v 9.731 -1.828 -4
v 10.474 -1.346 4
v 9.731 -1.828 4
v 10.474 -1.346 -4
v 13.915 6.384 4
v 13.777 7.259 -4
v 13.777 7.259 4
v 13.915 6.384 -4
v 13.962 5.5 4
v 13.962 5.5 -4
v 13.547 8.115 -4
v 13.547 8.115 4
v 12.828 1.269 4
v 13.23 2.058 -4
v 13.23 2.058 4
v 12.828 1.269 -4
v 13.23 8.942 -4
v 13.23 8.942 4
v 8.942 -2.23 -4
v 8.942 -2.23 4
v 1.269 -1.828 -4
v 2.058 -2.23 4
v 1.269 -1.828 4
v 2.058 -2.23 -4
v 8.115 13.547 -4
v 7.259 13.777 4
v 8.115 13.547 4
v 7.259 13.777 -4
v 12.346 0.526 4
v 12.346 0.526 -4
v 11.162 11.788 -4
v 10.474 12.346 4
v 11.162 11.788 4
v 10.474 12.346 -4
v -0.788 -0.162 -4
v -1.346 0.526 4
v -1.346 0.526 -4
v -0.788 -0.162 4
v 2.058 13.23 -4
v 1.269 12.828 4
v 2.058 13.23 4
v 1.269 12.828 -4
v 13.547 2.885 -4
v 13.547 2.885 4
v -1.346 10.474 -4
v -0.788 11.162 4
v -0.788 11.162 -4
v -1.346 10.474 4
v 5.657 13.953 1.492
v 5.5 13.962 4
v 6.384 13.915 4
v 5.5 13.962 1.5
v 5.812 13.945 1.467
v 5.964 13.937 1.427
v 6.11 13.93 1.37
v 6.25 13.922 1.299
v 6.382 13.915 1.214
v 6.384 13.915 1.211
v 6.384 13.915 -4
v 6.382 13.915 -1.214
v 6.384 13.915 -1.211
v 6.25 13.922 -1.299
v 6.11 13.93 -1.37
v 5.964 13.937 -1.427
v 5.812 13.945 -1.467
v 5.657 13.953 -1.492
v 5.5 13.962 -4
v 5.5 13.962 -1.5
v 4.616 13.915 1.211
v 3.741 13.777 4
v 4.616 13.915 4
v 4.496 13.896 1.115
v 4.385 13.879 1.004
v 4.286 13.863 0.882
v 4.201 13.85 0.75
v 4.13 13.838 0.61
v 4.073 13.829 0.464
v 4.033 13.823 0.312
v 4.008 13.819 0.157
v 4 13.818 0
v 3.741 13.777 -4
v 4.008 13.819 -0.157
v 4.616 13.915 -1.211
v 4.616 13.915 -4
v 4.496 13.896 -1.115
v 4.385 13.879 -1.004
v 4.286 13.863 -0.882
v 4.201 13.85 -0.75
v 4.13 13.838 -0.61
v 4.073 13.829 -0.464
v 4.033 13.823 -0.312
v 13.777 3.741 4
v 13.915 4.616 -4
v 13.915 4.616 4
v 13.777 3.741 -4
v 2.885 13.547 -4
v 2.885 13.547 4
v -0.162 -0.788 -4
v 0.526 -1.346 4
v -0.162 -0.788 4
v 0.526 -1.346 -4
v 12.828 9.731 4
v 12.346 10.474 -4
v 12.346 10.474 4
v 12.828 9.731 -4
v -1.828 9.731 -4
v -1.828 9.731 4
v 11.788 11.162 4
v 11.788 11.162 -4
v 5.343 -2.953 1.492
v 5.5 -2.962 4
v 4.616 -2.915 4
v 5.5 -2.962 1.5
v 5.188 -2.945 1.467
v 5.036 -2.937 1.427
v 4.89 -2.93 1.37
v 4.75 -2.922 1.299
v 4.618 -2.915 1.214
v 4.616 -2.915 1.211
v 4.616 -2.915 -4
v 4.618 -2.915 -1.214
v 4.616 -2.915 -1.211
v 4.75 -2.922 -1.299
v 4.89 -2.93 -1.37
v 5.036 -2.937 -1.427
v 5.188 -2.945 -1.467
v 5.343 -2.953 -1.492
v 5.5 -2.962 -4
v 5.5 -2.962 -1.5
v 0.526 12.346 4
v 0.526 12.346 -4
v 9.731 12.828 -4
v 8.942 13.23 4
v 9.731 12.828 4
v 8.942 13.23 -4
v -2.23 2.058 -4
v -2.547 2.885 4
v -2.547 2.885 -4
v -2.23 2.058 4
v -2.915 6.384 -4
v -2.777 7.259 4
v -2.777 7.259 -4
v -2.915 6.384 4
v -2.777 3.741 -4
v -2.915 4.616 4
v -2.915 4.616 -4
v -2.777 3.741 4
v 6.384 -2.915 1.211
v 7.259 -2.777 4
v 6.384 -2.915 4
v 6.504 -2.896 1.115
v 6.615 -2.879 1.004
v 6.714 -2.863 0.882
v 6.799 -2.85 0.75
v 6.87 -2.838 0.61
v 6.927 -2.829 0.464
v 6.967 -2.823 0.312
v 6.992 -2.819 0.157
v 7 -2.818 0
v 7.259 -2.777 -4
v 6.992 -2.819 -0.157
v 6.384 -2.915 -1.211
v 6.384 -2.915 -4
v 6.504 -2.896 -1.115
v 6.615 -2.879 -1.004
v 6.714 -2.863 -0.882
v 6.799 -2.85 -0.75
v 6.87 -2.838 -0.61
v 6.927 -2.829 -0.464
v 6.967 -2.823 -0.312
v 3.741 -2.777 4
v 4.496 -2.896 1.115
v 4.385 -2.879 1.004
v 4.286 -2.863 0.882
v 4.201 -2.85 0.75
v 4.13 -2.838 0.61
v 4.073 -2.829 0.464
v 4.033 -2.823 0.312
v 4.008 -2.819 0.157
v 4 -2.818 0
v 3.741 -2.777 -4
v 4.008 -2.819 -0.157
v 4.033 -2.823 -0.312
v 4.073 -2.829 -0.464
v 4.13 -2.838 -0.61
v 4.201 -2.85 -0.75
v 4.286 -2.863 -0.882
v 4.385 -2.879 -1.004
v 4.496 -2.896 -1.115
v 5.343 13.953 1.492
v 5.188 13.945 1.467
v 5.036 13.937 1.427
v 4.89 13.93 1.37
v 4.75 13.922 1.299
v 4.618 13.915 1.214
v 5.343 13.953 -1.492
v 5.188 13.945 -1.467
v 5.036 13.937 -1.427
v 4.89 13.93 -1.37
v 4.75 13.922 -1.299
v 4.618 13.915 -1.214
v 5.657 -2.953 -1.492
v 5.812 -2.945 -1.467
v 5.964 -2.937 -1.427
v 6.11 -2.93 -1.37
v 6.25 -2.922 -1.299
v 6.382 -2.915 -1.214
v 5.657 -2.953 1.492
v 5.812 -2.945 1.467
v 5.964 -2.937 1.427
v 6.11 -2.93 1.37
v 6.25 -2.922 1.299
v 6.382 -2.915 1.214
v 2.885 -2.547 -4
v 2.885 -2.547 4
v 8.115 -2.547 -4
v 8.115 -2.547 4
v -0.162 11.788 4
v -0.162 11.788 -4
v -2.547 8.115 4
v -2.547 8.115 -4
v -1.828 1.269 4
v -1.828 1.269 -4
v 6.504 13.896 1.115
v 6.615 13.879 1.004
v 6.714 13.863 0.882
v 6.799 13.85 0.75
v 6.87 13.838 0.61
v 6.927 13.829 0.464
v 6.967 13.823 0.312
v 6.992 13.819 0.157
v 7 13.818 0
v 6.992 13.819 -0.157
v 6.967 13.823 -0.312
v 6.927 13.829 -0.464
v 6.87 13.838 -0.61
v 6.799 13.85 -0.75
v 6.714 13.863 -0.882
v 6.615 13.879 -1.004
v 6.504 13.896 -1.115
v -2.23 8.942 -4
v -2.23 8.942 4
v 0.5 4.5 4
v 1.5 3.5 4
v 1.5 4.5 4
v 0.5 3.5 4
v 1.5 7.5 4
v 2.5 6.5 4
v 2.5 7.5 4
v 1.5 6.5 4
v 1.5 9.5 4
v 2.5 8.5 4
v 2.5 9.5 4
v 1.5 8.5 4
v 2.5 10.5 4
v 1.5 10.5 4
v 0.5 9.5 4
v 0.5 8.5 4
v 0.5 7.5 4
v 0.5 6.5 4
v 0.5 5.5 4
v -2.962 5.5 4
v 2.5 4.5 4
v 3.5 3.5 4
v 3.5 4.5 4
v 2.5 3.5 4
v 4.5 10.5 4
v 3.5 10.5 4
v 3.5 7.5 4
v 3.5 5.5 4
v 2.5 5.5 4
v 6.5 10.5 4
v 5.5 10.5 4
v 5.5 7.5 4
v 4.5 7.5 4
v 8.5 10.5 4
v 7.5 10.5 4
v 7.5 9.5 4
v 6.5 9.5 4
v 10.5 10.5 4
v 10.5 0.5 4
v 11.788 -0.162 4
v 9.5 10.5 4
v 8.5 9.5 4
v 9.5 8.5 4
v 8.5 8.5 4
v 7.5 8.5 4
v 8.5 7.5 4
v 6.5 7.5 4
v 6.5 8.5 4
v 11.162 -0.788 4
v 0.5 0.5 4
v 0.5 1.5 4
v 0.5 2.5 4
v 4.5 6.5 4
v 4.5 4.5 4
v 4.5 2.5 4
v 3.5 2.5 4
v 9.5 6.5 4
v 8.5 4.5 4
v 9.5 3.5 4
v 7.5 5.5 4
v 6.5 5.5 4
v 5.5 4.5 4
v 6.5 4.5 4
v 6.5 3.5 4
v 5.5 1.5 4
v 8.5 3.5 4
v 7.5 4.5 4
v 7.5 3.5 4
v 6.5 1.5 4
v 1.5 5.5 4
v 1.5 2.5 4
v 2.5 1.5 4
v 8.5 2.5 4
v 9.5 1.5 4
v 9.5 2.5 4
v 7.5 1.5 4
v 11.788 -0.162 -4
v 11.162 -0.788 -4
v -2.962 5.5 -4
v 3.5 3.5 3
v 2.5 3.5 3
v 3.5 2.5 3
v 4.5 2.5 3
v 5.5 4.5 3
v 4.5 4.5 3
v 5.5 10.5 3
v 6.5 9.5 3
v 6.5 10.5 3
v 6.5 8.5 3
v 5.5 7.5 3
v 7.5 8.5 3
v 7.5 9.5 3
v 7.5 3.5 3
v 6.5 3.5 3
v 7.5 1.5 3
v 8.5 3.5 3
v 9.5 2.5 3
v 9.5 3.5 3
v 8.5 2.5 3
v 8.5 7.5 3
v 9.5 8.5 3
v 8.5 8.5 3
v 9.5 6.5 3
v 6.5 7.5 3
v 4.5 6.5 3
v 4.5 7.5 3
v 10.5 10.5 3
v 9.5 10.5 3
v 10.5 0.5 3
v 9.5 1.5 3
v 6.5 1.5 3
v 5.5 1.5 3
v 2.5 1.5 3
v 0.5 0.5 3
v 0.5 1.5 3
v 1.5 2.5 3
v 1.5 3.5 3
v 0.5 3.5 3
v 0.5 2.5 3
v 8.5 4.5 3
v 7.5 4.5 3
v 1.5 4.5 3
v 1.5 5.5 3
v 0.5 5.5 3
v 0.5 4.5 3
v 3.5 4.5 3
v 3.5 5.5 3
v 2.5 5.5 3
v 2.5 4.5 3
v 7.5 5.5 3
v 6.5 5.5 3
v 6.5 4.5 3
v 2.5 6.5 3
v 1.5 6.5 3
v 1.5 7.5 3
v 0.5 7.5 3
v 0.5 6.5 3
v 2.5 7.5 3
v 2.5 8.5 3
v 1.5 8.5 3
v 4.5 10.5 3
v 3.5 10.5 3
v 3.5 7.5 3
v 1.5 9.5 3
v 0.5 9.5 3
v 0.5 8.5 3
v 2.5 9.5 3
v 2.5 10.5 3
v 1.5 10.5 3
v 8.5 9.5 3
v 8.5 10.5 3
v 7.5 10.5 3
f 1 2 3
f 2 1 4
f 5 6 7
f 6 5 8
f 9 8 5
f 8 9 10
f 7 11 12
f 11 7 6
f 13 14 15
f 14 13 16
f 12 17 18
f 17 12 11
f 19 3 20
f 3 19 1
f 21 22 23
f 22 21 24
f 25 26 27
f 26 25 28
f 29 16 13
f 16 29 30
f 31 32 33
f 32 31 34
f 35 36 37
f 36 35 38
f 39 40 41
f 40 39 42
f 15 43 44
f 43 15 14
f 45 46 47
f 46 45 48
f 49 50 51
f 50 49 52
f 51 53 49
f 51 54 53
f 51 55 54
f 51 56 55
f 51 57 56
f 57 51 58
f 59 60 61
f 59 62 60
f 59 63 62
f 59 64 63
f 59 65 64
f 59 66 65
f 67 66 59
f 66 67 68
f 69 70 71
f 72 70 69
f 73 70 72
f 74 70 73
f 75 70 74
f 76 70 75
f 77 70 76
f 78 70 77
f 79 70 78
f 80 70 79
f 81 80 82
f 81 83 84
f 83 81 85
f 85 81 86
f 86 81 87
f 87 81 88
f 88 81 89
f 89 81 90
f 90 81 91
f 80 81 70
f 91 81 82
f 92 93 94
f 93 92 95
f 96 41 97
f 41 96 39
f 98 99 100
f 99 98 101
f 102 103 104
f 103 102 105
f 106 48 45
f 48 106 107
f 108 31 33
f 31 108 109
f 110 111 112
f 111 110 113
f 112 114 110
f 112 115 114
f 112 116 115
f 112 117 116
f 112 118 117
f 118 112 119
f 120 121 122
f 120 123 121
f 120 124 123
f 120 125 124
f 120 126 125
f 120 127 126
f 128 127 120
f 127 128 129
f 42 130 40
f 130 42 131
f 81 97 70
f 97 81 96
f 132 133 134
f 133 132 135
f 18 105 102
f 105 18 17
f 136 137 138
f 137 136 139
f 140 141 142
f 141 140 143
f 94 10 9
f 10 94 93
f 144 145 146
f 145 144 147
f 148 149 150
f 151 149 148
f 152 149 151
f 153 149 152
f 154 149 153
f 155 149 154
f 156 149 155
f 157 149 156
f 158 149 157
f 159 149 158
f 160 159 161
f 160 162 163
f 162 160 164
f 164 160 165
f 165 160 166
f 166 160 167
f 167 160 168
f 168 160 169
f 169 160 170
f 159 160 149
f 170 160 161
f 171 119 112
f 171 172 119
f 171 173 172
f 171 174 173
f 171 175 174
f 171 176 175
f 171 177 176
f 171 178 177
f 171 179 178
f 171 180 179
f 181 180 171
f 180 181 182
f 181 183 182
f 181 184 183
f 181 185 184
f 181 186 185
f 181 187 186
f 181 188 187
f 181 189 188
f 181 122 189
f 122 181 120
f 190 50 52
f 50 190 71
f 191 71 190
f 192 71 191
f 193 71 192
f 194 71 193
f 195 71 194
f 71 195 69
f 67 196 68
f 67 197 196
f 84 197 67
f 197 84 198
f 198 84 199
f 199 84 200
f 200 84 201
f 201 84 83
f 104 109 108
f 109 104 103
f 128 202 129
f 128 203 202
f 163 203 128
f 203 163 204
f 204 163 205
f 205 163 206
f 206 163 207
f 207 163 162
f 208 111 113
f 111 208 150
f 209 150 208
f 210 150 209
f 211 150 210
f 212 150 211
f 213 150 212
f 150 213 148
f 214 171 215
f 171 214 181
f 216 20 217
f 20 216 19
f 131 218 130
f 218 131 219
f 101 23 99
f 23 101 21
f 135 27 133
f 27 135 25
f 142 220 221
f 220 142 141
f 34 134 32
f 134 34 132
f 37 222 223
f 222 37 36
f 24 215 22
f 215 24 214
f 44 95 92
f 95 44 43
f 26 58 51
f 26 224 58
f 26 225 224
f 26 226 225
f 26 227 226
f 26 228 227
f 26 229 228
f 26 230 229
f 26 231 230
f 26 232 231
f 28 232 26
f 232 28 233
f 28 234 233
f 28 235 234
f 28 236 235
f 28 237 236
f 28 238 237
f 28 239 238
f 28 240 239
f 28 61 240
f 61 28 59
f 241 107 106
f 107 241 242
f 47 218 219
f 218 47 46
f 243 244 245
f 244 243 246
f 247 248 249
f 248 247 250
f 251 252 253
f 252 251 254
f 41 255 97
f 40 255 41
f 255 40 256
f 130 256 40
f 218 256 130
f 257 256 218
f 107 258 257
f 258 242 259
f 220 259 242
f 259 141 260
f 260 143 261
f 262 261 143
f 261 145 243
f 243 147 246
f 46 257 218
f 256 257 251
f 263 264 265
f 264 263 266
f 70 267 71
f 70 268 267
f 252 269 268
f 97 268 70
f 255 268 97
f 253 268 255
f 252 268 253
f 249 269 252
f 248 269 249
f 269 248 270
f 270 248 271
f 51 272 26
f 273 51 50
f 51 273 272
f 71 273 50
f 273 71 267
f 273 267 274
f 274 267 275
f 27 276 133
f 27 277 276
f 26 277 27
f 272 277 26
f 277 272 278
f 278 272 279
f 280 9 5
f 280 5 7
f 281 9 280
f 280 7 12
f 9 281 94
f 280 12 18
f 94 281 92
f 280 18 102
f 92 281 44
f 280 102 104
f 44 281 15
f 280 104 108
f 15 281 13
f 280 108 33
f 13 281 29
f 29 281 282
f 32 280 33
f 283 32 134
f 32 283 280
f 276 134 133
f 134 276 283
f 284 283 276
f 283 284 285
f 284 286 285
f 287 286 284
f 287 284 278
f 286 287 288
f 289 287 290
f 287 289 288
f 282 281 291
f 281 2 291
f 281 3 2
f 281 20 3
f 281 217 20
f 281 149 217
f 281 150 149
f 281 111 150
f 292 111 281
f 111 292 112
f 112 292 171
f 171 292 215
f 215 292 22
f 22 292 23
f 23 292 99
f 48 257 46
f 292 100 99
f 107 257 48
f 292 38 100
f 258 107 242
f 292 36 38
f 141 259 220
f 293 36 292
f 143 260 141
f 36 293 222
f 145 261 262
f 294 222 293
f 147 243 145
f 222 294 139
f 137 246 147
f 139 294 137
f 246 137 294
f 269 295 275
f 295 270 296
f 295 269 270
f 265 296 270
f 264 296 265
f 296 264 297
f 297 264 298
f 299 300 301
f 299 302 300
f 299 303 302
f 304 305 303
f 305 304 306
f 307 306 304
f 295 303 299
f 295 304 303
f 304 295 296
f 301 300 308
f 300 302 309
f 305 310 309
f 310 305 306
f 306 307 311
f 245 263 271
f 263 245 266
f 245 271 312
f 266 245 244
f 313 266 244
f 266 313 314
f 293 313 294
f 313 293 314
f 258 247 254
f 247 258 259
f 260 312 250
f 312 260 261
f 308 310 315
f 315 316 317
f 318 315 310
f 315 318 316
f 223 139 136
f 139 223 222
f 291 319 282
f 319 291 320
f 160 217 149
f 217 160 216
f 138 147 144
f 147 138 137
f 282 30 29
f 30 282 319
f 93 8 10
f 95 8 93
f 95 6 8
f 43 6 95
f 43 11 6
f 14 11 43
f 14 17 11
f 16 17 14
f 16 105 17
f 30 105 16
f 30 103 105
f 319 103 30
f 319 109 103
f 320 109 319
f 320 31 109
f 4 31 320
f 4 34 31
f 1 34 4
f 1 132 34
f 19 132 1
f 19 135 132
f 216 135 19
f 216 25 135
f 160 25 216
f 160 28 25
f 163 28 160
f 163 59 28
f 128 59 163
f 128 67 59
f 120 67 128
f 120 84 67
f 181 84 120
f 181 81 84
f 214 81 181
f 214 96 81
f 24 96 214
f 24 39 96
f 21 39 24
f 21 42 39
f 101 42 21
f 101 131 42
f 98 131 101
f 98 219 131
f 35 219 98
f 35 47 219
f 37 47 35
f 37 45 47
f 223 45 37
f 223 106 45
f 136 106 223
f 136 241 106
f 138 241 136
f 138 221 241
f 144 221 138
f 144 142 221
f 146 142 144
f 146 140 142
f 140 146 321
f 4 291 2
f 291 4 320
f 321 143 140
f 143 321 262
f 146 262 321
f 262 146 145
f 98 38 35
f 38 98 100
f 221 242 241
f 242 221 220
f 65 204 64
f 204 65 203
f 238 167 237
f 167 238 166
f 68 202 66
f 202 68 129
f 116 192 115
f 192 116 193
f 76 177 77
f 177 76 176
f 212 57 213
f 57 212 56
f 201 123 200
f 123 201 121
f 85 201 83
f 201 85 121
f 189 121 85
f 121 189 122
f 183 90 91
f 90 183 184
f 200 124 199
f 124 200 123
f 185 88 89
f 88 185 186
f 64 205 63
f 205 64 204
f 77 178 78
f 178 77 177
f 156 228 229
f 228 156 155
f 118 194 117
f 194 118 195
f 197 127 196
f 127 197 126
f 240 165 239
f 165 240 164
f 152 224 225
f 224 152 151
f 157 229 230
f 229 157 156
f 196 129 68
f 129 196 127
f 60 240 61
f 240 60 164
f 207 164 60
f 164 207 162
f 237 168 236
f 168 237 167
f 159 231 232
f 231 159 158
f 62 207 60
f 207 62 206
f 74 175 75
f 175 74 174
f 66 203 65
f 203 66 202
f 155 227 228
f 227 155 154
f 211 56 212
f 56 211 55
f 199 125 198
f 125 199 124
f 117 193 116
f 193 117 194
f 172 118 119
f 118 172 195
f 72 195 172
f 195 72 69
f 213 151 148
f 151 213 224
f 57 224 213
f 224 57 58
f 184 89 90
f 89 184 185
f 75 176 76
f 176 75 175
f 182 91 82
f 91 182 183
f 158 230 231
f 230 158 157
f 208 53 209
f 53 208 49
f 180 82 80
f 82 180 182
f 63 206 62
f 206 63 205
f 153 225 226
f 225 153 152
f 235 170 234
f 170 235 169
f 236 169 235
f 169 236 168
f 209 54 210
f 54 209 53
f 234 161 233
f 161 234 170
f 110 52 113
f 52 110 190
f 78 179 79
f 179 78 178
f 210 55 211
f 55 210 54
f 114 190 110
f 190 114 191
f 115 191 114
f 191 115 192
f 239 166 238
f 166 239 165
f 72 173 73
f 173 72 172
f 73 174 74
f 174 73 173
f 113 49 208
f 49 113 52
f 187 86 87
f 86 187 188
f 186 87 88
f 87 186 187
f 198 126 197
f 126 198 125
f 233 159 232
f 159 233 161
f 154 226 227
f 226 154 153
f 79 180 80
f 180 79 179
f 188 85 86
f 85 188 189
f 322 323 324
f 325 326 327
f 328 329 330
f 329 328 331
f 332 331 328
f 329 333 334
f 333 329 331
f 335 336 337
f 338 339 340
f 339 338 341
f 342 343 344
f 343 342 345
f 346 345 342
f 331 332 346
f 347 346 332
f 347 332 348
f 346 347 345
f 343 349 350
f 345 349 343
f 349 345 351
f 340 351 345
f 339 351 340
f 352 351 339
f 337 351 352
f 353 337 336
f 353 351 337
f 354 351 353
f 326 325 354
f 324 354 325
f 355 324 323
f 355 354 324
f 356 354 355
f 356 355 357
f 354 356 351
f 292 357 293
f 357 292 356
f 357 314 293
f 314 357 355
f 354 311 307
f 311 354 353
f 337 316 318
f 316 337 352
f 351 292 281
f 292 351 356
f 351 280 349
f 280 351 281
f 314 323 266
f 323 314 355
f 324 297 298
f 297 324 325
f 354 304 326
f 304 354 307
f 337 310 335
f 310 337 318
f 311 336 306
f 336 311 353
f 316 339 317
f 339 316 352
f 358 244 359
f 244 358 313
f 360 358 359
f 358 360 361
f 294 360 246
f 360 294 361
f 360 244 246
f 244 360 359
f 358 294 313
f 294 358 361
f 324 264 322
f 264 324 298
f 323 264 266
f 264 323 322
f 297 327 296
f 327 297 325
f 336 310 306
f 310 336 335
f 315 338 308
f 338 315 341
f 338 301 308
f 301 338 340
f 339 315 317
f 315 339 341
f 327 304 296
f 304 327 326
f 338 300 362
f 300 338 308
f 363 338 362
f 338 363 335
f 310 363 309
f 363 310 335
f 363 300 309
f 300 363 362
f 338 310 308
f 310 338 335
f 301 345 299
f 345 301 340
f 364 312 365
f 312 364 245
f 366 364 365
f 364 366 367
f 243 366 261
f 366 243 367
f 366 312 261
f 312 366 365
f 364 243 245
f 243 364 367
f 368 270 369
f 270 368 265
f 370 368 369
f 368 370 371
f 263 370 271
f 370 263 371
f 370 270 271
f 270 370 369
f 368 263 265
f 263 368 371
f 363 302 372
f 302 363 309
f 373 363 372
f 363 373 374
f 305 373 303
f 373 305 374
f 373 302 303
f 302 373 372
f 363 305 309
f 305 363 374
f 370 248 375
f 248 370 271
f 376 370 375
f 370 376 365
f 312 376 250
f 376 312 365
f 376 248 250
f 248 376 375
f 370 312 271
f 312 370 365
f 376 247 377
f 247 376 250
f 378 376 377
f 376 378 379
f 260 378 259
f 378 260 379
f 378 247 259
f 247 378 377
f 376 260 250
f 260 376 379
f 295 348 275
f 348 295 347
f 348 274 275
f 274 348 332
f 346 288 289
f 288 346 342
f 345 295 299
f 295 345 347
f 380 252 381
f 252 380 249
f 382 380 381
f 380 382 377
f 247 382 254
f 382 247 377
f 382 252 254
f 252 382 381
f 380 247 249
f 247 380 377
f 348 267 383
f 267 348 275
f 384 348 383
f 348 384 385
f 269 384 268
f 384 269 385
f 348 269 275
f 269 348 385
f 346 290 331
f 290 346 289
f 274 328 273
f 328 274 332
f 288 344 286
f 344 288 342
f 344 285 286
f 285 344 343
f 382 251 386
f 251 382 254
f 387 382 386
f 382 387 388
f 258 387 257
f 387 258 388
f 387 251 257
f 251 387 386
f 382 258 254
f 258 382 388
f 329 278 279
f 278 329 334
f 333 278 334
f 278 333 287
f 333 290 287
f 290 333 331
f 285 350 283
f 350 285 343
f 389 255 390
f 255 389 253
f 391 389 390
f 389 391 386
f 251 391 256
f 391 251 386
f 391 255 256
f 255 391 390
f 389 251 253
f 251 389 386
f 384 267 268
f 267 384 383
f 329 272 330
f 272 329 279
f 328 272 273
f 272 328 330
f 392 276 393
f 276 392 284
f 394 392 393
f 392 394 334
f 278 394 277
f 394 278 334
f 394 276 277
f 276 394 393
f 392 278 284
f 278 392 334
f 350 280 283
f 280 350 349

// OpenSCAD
// file: atoi.scad
function atoi(a)=
(a=="!")?33:
(a=="\"")?34:
(a=="#")?35:
(a=="$")?36:
(a=="%")?37:
(a=="&")?38:
(a=="'")?39:
(a=="(")?40:
(a==")")?41:
(a=="*")?42:
(a=="+")?43:
(a==",")?44:
(a=="-")?45:
(a==".")?46:
(a=="/")?47:
(a=="0")?48:
(a=="1")?49:
(a=="2")?50:
(a=="3")?51:
(a=="4")?52:
(a=="5")?53:
(a=="6")?54:
(a=="7")?55:
(a=="8")?56:
(a=="9")?57:
(a==":")?58:
(a==";")?59:
(a=="<")?60:
(a=="=")?61:
(a==">")?62:
(a=="?")?63:
(a=="@")?64:
(a=="A")?65:
(a=="B")?66:
(a=="C")?67:
(a=="D")?68:
(a=="E")?69:
(a=="F")?70:
(a=="G")?71:
(a=="H")?72:
(a=="I")?73:
(a=="J")?74:
(a=="K")?75:
(a=="L")?76:
(a=="M")?77:
(a=="N")?78:
(a=="O")?79:
(a=="P")?80:
(a=="Q")?81:
(a=="R")?82:
(a=="S")?83:
(a=="T")?84:
(a=="U")?85:
(a=="V")?86:
(a=="W")?87:
(a=="X")?88:
(a=="Y")?89:
(a=="Z")?90:
(a=="[")?91:
(a=="\\")?92:
(a=="]")?93:
(a=="^")?94:
(a=="_")?95:
(a=="`")?96:
(a=="a")?97:
(a=="b")?98:
(a=="c")?99:
(a=="d")?100:
(a=="e")?101:
(a=="f")?102:
(a=="g")?103:
(a=="h")?104:
(a=="i")?105:
(a=="j")?106:
(a=="k")?107:
(a=="l")?108:
(a=="m")?109:
(a=="n")?110:
(a=="o")?111:
(a=="p")?112:
(a=="q")?113:
(a=="r")?114:
(a=="s")?115:
(a=="t")?116:
(a=="u")?117:
(a=="v")?118:
(a=="w")?119:
(a=="x")?120:
(a=="y")?121:
(a=="z")?122:
(a=="{")?123:
(a=="|")?124:
(a=="}")?125:
(a=="~")?126:
(a=="€")?128:
(a=="‚")?130:
(a=="ƒ")?131:
(a=="„")?132:
(a=="…")?133:
(a=="†")?134:
(a=="‡")?135:
(a=="ˆ")?136:
(a=="‰")?137:
(a=="Š")?138:
(a=="‹")?139:
(a=="Œ")?140:
(a=="Ž")?142:
(a=="‘")?145:
(a=="’")?146:
(a=="“")?147:
(a=="”")?148:
(a=="•")?149:
(a=="–")?150:
(a=="—")?151:
(a=="˜")?152:
(a=="™")?153:
(a=="š")?154:
(a=="›")?155:
(a=="œ")?156:
(a=="ž")?158:
(a=="Ÿ")?159:
(a=="¡")?161:
(a=="¢")?162:
(a=="£")?163:
(a=="¤")?164:
(a=="¥")?165:
(a=="¦")?166:
(a=="§")?167:
(a=="¨")?168:
(a=="©")?169:
(a=="ª")?170:
(a=="«")?171:
(a=="¬")?172:
(a=="®")?174:
(a=="¯")?175:
(a=="°")?176:
(a=="±")?177:
(a=="²")?178:
(a=="³")?179:
(a=="´")?180:
(a=="µ")?181:
(a=="¶")?182:
(a=="·")?183:
(a=="¸")?184:
(a=="¹")?185:
(a=="º")?186:
(a=="»")?187:
(a=="¼")?188:
(a=="½")?189:
(a=="¾")?190:
(a=="¿")?191:
(a=="À")?192:
(a=="Á")?193:
(a=="Â")?194:
(a=="Ã")?195:
(a=="Ä")?196:
(a=="Å")?197:
(a=="Æ")?198:
(a=="Ç")?199:
(a=="È")?200:
(a=="É")?201:
(a=="Ê")?202:
(a=="Ë")?203:
(a=="Ì")?204:
(a=="Í")?205:
(a=="Î")?206:
(a=="Ï")?207:
(a=="Ð")?208:
(a=="Ñ")?209:
(a=="Ò")?210:
(a=="Ó")?211:
(a=="Ô")?212:
(a=="Õ")?213:
(a=="Ö")?214:
(a=="×")?215:
(a=="Ø")?216:
(a=="Ù")?217:
(a=="Ú")?218:
(a=="Û")?219:
(a=="Ü")?220:
(a=="Ý")?221:
(a=="Þ")?222:
(a=="ß")?223:
(a=="à")?224:
(a=="á")?225:
(a=="â")?226:
(a=="ã")?227:
(a=="ä")?228:
(a=="å")?229:
(a=="æ")?230:
(a=="ç")?231:
(a=="è")?232:
(a=="é")?233:
(a=="ê")?234:
(a=="ë")?235:
(a=="ì")?236:
(a=="í")?237:
(a=="î")?238:
(a=="ï")?239:
(a=="ð")?240:
(a=="ñ")?241:
(a=="ò")?242:
(a=="ó")?243:
(a=="ô")?244:
(a=="õ")?245:
(a=="ö")?246:
(a=="÷")?247:
(a=="ø")?248:
(a=="ù")?249:
(a=="ú")?250:
(a=="û")?251:
(a=="ü")?252:
(a=="ý")?253:
(a=="þ")?254:
(a=="ÿ")?255:
0;
// file: write.scad
include <atoi.scad>;
module _write(font,s,h,p,i) {
	if(i<len(s)){
		if(s[i]==" "){
			translate([dxf_dim(file = font, name = str(atoi("-"),"_width")),0,0])
				_write(font,s,h,p,i+1);
		}else{
			linear_extrude(height=h) import(font,layer=atoi(s[i]));		
			translate([p+dxf_dim(file = font, name = str(atoi(s[i]),"_width")),0,0])
				_write(font,s,h,p,i+1);
		}
	}
}
module write(s,h,p){
	_write("GaroaHackerClubeBold.dxf",s,h,1,0);
}
module write_custom(font,s,h,p){
	_write(font,s,h,p,0);
}
// main file
use <write.scad>
rotate([0,0,0])difference(){translate([5.5,5.5,0])  cylinder(r=8.46153846153846,h=8,$fn=60, center=true);
rotate([180,0,90])translate([1,3,3])write("763",h=5,t=1,center=false);
rotate([90,90,0])translate([0,5.5,8])  cylinder(r=1.5,h=400, $fn=60, center=true);
translate([1,1,7])  cube(size = [1,1,8], center=true);
translate([2,1,7])  cube(size = [1,1,8], center=true);
translate([3,1,7])  cube(size = [1,1,8], center=true);
translate([4,1,7])  cube(size = [1,1,8], center=true);
translate([5,1,7])  cube(size = [1,1,8], center=true);
translate([6,1,7])  cube(size = [1,1,8], center=true);
translate([7,1,7])  cube(size = [1,1,8], center=true);
translate([8,1,7])  cube(size = [1,1,8], center=true);
translate([9,1,7])  cube(size = [1,1,8], center=true);
translate([10,1,7])  cube(size = [1,1,8], center=true);
translate([10,1,7])  cube(size = [1,1,8], center=true);
translate([10,1,7])  cube(size = [1,1,8], center=true);
translate([3,2,7])  cube(size = [1,1,8], center=true);
translate([4,2,7])  cube(size = [1,1,8], center=true);
translate([5,2,7])  cube(size = [1,1,8], center=true);
translate([5,2,7])  cube(size = [1,1,8], center=true);
translate([7,2,7])  cube(size = [1,1,8], center=true);
translate([7,2,7])  cube(size = [1,1,8], center=true);
translate([7,2,7])  cube(size = [1,1,8], center=true);
translate([10,2,7])  cube(size = [1,1,8], center=true);
translate([1,3,7])  cube(size = [1,1,8], center=true);
translate([1,3,7])  cube(size = [1,1,8], center=true);
translate([3,3,7])  cube(size = [1,1,8], center=true);
translate([3,3,7])  cube(size = [1,1,8], center=true);
translate([5,3,7])  cube(size = [1,1,8], center=true);
translate([5,3,7])  cube(size = [1,1,8], center=true);
translate([7,3,7])  cube(size = [1,1,8], center=true);
translate([7,3,7])  cube(size = [1,1,8], center=true);
translate([9,3,7])  cube(size = [1,1,8], center=true);
translate([10,3,7])  cube(size = [1,1,8], center=true);
translate([10,3,7])  cube(size = [1,1,8], center=true);
translate([10,3,7])  cube(size = [1,1,8], center=true);
translate([10,3,7])  cube(size = [1,1,8], center=true);
translate([10,3,7])  cube(size = [1,1,8], center=true);
translate([5,4,7])  cube(size = [1,1,8], center=true);
translate([5,4,7])  cube(size = [1,1,8], center=true);
translate([5,4,7])  cube(size = [1,1,8], center=true);
translate([8,4,7])  cube(size = [1,1,8], center=true);
translate([8,4,7])  cube(size = [1,1,8], center=true);
translate([10,4,7])  cube(size = [1,1,8], center=true);
translate([1,5,7])  cube(size = [1,1,8], center=true);
translate([1,5,7])  cube(size = [1,1,8], center=true);
translate([3,5,7])  cube(size = [1,1,8], center=true);
translate([3,5,7])  cube(size = [1,1,8], center=true);
translate([3,5,7])  cube(size = [1,1,8], center=true);
translate([3,5,7])  cube(size = [1,1,8], center=true);
translate([7,5,7])  cube(size = [1,1,8], center=true);
translate([7,5,7])  cube(size = [1,1,8], center=true);
translate([7,5,7])  cube(size = [1,1,8], center=true);
translate([10,5,7])  cube(size = [1,1,8], center=true);
translate([10,5,7])  cube(size = [1,1,8], center=true);
translate([2,6,7])  cube(size = [1,1,8], center=true);
translate([2,6,7])  cube(size = [1,1,8], center=true);
translate([2,6,7])  cube(size = [1,1,8], center=true);
translate([2,6,7])  cube(size = [1,1,8], center=true);
translate([2,6,7])  cube(size = [1,1,8], center=true);
translate([2,6,7])  cube(size = [1,1,8], center=true);
translate([2,6,7])  cube(size = [1,1,8], center=true);
translate([2,6,7])  cube(size = [1,1,8], center=true);
translate([10,6,7])  cube(size = [1,1,8], center=true);
translate([1,7,7])  cube(size = [1,1,8], center=true);
translate([1,7,7])  cube(size = [1,1,8], center=true);
translate([1,7,7])  cube(size = [1,1,8], center=true);
translate([1,7,7])  cube(size = [1,1,8], center=true);
translate([5,7,7])  cube(size = [1,1,8], center=true);
translate([6,7,7])  cube(size = [1,1,8], center=true);
translate([7,7,7])  cube(size = [1,1,8], center=true);
translate([8,7,7])  cube(size = [1,1,8], center=true);
translate([9,7,7])  cube(size = [1,1,8], center=true);
translate([10,7,7])  cube(size = [1,1,8], center=true);
translate([10,7,7])  cube(size = [1,1,8], center=true);
translate([2,8,7])  cube(size = [1,1,8], center=true);
translate([2,8,7])  cube(size = [1,1,8], center=true);
translate([4,8,7])  cube(size = [1,1,8], center=true);
translate([4,8,7])  cube(size = [1,1,8], center=true);
translate([6,8,7])  cube(size = [1,1,8], center=true);
translate([6,8,7])  cube(size = [1,1,8], center=true);
translate([6,8,7])  cube(size = [1,1,8], center=true);
translate([9,8,7])  cube(size = [1,1,8], center=true);
translate([10,8,7])  cube(size = [1,1,8], center=true);
translate([1,9,7])  cube(size = [1,1,8], center=true);
translate([1,9,7])  cube(size = [1,1,8], center=true);
translate([1,9,7])  cube(size = [1,1,8], center=true);
translate([4,9,7])  cube(size = [1,1,8], center=true);
translate([4,9,7])  cube(size = [1,1,8], center=true);
translate([6,9,7])  cube(size = [1,1,8], center=true);
translate([7,9,7])  cube(size = [1,1,8], center=true);
translate([7,9,7])  cube(size = [1,1,8], center=true);
translate([7,9,7])  cube(size = [1,1,8], center=true);
translate([10,9,7])  cube(size = [1,1,8], center=true);
translate([10,9,7])  cube(size = [1,1,8], center=true);
translate([2,10,7])  cube(size = [1,1,8], center=true);
translate([2,10,7])  cube(size = [1,1,8], center=true);
translate([4,10,7])  cube(size = [1,1,8], center=true);
translate([4,10,7])  cube(size = [1,1,8], center=true);
translate([6,10,7])  cube(size = [1,1,8], center=true);
translate([6,10,7])  cube(size = [1,1,8], center=true);
translate([8,10,7])  cube(size = [1,1,8], center=true);
translate([8,10,7])  cube(size = [1,1,8], center=true);
translate([10,10,7])  cube(size = [1,1,8], center=true);
}
